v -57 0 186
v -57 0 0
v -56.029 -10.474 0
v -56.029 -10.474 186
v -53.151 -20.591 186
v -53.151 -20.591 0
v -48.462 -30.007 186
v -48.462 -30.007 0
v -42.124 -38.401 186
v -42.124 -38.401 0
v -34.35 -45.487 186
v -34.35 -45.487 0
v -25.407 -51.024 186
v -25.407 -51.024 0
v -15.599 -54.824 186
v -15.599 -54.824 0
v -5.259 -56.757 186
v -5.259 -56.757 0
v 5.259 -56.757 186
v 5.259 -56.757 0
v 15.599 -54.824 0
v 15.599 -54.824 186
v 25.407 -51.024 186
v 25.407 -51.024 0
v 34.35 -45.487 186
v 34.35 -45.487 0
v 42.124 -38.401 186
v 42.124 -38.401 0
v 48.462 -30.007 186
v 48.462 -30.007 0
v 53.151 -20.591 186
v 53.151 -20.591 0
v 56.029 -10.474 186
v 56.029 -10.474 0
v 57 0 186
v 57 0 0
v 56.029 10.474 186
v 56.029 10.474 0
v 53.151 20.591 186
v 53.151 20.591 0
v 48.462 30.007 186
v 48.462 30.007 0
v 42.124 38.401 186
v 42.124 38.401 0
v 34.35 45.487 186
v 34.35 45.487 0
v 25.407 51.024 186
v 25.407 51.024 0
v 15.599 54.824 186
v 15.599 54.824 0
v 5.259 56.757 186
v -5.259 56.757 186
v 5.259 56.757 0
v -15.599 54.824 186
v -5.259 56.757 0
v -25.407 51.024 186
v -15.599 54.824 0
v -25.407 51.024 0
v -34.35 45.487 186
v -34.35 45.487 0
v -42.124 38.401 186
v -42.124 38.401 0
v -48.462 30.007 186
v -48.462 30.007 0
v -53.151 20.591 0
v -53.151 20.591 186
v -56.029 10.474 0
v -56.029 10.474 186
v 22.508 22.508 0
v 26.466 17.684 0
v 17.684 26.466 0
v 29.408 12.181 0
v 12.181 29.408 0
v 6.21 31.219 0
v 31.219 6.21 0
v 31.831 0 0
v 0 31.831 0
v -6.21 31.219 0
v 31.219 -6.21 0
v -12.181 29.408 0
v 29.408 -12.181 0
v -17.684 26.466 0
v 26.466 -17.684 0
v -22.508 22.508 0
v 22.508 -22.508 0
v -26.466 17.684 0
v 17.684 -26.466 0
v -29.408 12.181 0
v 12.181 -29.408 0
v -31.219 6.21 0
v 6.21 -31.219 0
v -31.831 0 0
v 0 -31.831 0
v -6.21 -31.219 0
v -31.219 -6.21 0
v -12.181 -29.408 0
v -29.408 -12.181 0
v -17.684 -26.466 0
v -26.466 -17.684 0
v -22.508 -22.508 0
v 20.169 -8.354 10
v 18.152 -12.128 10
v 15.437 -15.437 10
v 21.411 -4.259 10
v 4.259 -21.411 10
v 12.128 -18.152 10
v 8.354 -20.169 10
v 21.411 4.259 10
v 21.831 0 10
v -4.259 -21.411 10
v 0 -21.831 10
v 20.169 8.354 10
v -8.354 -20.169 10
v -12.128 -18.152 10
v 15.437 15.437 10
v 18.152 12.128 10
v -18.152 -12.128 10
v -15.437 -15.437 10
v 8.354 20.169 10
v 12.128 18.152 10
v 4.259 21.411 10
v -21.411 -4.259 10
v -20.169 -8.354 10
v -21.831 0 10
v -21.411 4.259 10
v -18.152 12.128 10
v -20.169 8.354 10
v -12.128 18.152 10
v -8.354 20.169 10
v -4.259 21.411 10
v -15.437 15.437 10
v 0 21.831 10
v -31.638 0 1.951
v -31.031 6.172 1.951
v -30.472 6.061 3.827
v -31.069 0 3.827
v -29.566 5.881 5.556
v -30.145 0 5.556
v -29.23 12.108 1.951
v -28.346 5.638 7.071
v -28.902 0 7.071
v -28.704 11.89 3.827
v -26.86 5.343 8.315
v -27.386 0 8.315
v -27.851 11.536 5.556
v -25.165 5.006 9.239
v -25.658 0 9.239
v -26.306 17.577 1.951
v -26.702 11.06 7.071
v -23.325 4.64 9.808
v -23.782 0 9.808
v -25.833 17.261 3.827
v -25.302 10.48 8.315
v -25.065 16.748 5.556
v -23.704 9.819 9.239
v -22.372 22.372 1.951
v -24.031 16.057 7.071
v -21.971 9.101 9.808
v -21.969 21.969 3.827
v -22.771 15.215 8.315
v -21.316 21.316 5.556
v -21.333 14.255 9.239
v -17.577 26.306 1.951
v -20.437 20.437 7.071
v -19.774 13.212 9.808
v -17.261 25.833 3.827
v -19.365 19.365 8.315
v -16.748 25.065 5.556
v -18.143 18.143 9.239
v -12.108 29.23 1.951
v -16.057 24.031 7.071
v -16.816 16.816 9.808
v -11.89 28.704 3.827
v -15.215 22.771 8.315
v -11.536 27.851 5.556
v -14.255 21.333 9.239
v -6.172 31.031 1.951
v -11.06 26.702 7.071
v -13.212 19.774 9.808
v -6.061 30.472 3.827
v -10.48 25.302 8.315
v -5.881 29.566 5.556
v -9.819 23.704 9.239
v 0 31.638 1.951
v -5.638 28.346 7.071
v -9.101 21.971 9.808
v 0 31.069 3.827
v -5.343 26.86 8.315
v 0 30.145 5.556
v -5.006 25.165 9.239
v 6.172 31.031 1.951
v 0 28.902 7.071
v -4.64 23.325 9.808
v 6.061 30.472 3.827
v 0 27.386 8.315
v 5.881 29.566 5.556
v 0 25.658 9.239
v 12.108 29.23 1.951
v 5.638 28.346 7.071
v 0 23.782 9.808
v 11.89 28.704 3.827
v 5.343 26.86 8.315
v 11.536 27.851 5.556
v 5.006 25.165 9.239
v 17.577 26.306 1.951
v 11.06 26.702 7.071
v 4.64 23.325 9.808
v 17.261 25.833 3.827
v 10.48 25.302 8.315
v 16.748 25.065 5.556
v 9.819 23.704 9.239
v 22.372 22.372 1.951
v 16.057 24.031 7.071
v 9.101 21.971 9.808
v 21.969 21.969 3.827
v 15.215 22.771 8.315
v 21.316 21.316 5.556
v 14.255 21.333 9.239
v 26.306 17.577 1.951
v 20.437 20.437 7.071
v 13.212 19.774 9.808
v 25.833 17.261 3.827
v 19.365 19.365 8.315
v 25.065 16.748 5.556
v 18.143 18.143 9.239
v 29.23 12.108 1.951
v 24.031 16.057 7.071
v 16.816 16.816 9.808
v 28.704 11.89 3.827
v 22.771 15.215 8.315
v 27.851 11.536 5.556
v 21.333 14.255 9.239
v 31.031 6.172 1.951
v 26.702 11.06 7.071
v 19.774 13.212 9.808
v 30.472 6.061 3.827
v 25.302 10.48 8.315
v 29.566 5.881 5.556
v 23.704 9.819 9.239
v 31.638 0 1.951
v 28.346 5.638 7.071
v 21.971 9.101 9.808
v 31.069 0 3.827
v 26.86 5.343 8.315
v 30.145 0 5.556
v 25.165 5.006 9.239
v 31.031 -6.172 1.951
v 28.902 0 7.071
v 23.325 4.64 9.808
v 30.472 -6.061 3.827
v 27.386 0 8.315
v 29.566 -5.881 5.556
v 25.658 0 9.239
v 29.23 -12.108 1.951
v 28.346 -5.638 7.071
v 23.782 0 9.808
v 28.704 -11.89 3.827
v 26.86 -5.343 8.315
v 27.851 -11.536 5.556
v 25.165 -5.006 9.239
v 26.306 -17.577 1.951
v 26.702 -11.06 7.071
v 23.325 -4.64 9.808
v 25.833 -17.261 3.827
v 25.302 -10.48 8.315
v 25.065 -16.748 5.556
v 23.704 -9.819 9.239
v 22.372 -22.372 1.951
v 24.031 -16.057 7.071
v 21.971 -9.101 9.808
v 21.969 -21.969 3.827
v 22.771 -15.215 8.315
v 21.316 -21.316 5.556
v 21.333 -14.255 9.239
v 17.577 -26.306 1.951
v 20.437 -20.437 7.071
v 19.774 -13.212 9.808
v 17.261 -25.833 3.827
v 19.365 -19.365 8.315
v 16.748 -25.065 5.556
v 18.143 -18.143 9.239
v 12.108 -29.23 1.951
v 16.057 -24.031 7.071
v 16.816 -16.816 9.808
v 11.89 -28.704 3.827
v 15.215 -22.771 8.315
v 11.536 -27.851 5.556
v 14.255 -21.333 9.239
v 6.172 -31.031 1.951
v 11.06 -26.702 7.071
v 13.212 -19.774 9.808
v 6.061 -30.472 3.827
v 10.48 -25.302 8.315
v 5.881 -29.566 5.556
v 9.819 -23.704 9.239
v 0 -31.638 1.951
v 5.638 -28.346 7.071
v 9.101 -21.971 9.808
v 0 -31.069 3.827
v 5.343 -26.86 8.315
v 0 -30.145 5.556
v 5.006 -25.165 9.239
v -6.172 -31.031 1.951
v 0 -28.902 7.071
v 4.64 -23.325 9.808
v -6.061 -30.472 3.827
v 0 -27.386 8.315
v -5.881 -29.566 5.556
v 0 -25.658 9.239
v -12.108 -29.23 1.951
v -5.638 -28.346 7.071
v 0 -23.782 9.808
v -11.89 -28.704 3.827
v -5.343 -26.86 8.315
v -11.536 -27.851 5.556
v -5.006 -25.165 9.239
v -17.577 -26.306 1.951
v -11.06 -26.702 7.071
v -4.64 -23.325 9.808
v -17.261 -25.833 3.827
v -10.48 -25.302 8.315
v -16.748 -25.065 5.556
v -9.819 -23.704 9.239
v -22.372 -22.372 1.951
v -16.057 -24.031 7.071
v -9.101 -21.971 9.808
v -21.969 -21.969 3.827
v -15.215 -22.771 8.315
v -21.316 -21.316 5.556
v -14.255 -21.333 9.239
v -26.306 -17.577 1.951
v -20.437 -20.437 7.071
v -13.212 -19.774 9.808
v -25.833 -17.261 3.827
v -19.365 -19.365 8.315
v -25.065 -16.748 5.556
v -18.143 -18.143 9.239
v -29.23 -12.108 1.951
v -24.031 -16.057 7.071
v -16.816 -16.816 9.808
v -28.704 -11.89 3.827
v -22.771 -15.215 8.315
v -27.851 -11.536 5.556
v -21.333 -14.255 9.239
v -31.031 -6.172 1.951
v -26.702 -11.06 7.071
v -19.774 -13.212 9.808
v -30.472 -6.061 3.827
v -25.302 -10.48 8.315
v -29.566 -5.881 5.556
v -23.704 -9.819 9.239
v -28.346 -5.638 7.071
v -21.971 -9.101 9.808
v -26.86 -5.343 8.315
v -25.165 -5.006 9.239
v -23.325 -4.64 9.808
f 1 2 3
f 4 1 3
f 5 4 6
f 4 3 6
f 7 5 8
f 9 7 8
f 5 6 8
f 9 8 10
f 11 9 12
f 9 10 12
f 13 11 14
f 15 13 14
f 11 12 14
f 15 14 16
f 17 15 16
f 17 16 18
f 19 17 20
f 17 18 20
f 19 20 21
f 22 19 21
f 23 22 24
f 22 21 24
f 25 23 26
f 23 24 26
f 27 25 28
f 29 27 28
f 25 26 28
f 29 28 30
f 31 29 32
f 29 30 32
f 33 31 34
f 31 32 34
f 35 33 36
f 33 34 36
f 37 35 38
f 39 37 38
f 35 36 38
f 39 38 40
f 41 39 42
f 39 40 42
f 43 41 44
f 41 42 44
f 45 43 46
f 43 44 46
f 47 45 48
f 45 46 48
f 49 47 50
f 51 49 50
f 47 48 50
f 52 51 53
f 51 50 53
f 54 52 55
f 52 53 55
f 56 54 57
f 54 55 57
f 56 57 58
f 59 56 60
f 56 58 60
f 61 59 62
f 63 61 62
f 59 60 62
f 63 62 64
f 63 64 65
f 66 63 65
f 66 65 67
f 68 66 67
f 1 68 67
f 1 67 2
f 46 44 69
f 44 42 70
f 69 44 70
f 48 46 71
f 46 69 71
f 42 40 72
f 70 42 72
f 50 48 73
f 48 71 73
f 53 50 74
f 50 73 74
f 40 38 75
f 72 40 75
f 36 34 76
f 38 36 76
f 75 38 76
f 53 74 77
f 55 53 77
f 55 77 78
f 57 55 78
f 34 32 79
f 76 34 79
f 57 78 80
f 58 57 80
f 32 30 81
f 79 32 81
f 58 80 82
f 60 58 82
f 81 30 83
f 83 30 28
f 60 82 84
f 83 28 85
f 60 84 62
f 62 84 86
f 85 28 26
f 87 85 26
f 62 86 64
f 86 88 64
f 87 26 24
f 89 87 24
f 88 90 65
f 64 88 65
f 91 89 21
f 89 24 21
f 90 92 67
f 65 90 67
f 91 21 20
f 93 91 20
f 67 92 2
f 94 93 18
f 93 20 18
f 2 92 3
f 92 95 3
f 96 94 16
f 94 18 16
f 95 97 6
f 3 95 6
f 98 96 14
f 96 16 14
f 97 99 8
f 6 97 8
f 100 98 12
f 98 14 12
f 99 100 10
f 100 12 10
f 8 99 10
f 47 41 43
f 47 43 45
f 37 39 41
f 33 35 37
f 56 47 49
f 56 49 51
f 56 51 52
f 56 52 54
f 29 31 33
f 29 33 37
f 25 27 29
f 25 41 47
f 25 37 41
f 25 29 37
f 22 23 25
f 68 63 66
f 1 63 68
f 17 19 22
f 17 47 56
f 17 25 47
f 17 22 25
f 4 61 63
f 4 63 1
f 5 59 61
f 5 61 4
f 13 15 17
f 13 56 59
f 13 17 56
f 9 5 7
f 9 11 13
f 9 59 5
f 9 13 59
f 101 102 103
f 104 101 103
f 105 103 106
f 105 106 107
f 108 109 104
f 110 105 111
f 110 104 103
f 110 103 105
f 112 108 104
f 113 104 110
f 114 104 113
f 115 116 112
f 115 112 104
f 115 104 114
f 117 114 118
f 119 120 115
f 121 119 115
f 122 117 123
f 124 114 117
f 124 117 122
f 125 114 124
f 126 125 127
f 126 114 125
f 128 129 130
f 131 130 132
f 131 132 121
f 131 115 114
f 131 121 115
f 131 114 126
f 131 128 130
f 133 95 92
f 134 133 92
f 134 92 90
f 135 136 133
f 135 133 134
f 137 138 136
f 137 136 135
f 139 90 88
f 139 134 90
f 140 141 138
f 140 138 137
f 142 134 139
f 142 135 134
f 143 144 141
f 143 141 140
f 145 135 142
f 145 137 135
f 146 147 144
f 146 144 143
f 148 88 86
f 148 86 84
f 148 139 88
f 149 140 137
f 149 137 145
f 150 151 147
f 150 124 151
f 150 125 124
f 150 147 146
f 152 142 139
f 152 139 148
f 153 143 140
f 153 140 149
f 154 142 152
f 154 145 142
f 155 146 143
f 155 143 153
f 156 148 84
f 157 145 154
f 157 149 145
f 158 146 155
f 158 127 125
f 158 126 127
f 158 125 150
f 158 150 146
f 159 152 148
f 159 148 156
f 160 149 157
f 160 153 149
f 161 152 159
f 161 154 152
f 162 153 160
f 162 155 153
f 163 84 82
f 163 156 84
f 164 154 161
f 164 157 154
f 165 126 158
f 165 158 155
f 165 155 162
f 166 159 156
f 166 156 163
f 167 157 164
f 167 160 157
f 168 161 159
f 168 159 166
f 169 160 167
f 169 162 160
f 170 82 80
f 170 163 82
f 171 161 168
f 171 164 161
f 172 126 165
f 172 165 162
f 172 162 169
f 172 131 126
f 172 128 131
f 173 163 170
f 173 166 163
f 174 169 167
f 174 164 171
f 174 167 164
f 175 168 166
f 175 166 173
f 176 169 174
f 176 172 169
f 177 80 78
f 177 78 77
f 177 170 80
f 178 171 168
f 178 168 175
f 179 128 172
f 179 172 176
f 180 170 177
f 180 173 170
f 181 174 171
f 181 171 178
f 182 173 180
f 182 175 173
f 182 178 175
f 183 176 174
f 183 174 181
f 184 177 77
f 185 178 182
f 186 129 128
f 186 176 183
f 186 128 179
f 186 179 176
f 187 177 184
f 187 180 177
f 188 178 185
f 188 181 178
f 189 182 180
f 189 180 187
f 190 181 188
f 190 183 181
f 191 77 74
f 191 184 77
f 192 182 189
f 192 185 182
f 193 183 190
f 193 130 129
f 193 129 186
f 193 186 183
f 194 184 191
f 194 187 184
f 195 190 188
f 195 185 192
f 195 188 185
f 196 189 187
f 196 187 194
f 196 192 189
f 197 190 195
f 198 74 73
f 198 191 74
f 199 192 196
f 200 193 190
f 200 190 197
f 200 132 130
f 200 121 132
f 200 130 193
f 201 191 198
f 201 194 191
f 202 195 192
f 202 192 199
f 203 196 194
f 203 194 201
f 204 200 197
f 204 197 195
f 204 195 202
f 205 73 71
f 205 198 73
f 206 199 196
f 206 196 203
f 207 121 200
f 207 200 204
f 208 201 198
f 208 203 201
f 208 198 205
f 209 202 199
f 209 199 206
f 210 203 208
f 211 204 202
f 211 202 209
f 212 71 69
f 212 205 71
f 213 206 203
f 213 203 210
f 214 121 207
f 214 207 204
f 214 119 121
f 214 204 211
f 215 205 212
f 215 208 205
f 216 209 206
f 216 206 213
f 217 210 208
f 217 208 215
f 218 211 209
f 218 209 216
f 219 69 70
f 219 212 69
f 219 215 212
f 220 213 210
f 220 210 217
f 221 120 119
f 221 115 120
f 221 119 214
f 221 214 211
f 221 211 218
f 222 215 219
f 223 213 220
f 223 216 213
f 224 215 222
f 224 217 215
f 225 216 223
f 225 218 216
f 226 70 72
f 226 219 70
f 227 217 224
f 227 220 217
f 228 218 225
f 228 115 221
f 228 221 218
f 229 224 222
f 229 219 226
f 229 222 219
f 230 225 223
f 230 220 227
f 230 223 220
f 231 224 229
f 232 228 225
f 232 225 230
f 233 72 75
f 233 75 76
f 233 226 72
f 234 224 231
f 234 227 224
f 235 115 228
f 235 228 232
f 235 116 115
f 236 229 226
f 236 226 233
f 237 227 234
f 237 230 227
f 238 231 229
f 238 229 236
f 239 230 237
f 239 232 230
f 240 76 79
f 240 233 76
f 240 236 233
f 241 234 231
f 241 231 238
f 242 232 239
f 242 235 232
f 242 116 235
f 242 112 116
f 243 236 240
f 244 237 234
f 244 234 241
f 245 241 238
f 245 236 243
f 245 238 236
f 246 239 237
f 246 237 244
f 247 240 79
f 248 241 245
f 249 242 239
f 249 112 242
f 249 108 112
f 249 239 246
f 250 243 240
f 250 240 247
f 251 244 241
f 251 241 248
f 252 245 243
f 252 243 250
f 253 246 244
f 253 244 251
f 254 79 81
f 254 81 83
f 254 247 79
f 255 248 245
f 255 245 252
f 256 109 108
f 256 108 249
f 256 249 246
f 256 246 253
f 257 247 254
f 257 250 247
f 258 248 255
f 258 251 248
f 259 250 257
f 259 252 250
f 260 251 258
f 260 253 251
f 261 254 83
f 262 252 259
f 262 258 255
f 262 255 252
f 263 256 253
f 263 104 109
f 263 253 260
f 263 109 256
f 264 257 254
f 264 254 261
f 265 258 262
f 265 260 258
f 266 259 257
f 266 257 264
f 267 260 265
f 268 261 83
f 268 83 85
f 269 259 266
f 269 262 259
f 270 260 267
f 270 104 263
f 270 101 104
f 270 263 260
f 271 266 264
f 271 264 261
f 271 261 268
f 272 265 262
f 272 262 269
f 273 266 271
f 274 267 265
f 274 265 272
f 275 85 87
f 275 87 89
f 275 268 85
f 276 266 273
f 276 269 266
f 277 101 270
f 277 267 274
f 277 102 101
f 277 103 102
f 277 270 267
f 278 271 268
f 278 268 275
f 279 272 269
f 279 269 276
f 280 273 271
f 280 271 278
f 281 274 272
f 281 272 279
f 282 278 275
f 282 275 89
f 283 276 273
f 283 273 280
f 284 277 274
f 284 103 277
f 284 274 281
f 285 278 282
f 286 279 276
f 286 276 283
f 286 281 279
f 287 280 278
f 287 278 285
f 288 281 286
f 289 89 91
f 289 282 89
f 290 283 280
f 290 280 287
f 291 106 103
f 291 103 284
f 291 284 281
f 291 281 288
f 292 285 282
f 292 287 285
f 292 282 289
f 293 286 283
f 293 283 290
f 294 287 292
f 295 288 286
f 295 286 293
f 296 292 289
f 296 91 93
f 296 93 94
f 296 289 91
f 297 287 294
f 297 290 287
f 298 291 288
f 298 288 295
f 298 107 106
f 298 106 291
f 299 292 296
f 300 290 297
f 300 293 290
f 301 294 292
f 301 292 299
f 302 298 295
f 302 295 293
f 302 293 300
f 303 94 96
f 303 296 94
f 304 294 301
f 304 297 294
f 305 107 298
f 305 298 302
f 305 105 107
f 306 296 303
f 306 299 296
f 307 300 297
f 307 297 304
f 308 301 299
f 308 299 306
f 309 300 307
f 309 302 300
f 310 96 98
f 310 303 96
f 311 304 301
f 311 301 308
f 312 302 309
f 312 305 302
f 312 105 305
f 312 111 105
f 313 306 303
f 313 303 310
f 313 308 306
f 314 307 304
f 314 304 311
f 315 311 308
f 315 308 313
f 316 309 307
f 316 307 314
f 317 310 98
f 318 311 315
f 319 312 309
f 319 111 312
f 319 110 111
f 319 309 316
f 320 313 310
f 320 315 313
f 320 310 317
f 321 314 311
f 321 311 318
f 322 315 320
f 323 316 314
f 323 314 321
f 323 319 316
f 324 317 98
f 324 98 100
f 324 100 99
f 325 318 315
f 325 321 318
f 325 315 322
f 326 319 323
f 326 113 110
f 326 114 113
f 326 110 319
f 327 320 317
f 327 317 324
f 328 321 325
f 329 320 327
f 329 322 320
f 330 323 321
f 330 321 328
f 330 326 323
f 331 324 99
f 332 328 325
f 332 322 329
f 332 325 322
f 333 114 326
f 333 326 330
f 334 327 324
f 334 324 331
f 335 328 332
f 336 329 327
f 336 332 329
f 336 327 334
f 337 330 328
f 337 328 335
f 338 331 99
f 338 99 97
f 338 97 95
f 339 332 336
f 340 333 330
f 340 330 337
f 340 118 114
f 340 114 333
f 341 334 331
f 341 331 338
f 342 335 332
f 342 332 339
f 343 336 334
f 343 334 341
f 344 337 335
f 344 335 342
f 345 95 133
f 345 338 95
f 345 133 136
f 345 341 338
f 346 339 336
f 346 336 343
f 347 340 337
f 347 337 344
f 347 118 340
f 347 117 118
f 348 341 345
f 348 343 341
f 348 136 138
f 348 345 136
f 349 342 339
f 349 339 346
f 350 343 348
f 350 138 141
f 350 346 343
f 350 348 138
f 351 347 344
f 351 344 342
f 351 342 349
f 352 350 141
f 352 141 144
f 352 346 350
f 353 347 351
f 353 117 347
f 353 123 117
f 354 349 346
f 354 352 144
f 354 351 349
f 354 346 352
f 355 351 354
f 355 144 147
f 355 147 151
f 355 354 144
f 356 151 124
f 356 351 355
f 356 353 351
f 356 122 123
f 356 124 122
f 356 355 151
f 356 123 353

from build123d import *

# Parameters (mm, degrees)
SKETCH1_R           = 57
BOSS_EXTRUDE1_DEPTH = 186
SKETCH2_R           = 31.83061868
CUT_EXTRUDE1_DEPTH  = 10
FILLET1_R           = 10


with BuildPart() as part:
    # Sketch1 → Boss-Extrude1 (new body)
    with BuildSketch(Plane.XY):
        with Locations(Location((0, 0, 0), (0, 0, 180))):
            Circle(SKETCH1_R)
    extrude(amount=BOSS_EXTRUDE1_DEPTH)

    # Sketch2 → Cut-Extrude1 (cut)
    with BuildSketch(Plane(origin=(0, 0, 0), x_dir=(-1, 0, 0), z_dir=(0, 0, -1))):
        Circle(SKETCH2_R)
    extrude(amount=-CUT_EXTRUDE1_DEPTH, mode=Mode.SUBTRACT)

    # Fillet1
    fillet1_edges = [part.edges().sort_by_distance(p)[0] for p in [
        (31.83061868, 0, 10),
    ]]
    fillet(fillet1_edges, radius=FILLET1_R - 0.0001)  # a hair under: the kernel refuses the full size


solid = part.part
